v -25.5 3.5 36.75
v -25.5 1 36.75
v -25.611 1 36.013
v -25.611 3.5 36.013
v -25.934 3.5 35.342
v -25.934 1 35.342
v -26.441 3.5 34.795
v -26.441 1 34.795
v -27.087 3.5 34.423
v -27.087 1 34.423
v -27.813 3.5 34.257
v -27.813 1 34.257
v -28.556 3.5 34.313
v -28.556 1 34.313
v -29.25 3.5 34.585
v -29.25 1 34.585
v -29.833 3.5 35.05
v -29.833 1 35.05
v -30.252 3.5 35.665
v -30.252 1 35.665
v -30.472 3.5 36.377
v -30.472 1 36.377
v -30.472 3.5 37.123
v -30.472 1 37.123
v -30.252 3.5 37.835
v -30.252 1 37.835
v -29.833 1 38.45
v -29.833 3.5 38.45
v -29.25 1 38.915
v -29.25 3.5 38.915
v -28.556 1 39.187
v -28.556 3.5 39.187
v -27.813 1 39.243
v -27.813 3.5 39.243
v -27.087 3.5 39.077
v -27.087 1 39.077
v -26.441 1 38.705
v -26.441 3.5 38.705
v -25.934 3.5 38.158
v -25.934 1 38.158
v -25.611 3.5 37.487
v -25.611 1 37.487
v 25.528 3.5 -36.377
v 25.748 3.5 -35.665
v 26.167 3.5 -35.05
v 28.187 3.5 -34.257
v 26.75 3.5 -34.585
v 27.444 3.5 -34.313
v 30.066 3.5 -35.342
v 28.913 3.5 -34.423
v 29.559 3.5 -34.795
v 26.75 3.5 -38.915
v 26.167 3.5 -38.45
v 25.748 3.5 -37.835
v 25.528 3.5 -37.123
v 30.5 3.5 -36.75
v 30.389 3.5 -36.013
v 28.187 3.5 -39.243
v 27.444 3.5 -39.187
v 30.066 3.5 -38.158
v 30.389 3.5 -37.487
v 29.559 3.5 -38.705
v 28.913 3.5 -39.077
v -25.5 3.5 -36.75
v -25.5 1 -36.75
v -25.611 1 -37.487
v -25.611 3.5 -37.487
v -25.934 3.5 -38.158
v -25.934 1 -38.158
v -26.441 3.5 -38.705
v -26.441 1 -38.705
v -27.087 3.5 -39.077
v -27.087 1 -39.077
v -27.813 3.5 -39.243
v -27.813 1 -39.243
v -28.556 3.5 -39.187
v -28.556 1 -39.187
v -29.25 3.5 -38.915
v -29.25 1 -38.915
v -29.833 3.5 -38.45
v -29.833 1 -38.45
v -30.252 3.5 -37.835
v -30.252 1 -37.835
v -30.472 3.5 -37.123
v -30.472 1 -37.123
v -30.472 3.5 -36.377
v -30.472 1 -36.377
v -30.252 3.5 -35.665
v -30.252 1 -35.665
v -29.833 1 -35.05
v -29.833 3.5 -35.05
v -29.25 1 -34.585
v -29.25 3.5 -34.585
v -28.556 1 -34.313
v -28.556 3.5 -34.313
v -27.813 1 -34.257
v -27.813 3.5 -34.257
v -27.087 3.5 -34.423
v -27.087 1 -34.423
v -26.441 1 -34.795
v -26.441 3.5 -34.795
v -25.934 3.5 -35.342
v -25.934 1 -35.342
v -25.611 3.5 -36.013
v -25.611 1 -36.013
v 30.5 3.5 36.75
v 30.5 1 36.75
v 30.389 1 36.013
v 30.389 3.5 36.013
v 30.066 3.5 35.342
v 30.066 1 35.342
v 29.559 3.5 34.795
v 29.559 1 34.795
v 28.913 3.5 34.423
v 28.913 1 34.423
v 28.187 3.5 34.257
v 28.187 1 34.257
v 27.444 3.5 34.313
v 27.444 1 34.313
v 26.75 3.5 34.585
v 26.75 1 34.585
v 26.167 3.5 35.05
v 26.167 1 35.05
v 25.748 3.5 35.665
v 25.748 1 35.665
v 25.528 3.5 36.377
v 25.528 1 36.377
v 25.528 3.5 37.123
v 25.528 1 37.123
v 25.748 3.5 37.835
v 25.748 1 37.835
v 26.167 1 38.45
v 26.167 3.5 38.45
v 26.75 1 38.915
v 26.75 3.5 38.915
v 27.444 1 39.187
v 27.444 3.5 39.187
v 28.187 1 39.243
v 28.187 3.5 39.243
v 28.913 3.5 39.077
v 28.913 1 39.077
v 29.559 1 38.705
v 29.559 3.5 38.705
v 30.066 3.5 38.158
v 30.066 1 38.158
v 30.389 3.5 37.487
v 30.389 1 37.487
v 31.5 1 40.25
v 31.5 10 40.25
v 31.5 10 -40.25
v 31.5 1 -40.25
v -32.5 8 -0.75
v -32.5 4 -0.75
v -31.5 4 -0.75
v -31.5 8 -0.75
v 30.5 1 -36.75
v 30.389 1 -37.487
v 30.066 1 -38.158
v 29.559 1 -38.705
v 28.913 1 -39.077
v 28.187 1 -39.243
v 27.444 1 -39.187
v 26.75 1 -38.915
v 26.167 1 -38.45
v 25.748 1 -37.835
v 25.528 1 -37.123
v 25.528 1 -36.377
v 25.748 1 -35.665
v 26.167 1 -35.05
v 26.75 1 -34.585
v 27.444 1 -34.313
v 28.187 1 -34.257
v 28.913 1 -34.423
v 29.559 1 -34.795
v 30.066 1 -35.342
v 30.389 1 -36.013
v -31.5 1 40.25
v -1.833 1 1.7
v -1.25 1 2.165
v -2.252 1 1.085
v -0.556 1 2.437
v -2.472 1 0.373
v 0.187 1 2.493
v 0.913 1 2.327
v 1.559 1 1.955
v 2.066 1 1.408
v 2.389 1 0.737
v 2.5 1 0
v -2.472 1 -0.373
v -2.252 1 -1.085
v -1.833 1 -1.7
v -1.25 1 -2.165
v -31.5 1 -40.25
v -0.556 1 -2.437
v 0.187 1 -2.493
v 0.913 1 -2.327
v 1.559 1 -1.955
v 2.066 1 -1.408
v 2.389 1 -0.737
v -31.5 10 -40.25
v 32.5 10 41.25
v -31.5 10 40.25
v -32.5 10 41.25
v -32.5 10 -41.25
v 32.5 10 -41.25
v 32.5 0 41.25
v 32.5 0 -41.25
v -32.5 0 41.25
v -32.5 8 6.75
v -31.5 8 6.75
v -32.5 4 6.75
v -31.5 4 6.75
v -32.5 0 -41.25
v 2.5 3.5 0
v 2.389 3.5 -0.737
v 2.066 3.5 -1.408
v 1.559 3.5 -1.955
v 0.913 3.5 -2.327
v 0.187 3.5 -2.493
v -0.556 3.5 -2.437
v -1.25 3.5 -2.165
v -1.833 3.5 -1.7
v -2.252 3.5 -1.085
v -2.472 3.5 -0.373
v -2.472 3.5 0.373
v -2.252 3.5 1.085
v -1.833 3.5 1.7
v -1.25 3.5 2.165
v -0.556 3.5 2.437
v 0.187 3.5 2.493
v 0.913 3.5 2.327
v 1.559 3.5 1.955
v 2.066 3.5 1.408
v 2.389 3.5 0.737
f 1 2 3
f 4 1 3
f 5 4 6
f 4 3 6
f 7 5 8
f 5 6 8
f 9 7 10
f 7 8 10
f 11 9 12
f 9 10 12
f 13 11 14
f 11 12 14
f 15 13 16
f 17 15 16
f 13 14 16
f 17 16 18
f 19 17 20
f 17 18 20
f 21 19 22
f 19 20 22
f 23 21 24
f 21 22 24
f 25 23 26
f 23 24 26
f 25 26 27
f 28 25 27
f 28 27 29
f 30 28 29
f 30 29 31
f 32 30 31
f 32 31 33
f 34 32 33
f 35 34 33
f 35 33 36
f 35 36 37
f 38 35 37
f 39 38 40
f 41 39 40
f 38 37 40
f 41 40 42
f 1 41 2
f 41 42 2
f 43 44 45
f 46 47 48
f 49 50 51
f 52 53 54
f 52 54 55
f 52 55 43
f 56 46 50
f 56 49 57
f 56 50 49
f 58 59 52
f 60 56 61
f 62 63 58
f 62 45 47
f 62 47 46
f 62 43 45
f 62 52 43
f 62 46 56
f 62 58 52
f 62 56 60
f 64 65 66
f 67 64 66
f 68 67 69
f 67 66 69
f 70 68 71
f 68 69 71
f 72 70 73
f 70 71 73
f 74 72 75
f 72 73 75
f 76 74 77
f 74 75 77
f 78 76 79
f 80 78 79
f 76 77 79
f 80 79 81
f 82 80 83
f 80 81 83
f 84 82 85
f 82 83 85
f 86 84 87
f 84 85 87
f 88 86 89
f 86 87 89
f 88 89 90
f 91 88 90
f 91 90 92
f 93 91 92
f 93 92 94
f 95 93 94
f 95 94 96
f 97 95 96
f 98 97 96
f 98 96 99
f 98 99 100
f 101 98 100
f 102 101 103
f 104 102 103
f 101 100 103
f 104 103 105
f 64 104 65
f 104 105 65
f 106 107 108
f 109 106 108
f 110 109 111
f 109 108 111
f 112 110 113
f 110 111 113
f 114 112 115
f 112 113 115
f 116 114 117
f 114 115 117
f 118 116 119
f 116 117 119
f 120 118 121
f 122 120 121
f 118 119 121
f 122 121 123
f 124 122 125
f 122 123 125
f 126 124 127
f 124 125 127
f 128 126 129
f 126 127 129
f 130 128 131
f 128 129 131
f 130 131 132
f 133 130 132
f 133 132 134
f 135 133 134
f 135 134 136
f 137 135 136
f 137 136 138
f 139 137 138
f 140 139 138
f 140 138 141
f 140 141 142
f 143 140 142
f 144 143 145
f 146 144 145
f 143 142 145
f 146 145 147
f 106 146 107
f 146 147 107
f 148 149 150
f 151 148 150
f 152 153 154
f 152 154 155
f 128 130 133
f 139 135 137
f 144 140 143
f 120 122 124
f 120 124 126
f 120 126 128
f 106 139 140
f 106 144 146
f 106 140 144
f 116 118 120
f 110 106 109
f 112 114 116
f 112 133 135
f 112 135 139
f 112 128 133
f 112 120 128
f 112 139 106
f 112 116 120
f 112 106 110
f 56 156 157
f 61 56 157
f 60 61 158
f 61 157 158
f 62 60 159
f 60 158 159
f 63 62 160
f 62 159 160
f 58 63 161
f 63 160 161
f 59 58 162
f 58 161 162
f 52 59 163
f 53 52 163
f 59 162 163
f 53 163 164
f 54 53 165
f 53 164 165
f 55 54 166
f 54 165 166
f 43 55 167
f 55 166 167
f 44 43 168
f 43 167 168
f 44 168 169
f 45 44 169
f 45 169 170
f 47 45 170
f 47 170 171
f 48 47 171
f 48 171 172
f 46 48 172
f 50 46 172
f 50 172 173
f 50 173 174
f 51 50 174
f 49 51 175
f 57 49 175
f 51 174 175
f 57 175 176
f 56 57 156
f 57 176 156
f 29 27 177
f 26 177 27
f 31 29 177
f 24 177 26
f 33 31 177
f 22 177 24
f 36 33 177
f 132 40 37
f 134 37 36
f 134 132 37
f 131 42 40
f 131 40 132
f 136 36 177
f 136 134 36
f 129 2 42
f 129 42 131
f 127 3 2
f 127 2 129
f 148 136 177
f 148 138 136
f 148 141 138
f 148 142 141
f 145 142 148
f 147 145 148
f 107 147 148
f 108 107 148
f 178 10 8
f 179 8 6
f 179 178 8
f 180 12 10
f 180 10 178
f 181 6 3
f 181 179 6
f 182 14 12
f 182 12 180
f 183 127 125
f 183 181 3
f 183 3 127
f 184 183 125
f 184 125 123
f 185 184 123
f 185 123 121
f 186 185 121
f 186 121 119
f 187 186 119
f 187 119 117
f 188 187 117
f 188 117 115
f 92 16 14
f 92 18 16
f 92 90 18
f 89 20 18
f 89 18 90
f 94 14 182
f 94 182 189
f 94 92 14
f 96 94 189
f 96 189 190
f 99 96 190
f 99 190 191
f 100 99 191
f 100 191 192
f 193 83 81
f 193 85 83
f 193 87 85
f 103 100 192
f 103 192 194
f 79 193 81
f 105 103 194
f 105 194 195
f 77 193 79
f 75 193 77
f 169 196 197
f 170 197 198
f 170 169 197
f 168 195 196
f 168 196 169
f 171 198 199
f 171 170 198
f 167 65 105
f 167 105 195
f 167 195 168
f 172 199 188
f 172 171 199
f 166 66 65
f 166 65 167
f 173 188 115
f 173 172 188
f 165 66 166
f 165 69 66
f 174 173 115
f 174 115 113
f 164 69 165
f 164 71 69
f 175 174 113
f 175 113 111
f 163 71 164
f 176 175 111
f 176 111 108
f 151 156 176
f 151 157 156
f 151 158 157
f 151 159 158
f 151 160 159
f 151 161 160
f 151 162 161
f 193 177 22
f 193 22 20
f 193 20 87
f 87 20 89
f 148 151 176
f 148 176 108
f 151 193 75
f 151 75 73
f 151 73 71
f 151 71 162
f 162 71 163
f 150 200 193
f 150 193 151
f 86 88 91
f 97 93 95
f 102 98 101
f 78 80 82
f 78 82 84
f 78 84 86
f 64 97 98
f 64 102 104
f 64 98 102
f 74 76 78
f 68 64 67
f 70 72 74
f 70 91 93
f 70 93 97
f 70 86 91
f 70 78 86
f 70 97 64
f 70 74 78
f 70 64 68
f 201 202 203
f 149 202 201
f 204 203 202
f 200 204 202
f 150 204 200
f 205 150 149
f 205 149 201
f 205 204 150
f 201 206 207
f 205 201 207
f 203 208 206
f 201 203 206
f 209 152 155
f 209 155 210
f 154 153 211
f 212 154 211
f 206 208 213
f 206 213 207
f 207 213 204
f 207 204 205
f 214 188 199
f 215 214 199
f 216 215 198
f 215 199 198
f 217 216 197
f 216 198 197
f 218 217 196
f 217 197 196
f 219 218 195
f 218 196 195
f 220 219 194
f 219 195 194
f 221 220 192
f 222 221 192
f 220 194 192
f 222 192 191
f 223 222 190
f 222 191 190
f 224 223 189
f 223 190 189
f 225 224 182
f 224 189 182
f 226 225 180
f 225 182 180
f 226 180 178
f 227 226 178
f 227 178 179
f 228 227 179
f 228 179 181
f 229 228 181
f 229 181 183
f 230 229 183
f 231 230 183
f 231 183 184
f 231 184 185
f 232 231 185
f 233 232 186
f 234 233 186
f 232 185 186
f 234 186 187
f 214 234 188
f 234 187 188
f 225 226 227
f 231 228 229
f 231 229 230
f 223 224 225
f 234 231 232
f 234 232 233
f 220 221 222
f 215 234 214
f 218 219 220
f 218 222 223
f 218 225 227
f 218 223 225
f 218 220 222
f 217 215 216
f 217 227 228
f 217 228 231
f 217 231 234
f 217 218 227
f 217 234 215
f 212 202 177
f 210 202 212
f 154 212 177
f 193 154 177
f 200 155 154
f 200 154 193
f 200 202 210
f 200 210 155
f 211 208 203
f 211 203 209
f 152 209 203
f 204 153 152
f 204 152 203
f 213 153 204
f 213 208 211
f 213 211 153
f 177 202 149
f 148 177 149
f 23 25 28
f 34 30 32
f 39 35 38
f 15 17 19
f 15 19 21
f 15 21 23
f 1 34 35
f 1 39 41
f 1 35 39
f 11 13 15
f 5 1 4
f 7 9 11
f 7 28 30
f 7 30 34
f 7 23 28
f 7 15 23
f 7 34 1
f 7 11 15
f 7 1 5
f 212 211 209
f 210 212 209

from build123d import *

# Parameters (mm, degrees)
SKETCH1_W           = 65
SKETCH1_H           = 82.5
BOSS_EXTRUDE1_DEPTH = 10
SKETCH2_W           = 63
SKETCH2_H           = 80.5
CUT_EXTRUDE1_DEPTH  = 9
SKETCH4_R           = 2.5
BOSS_EXTRUDE2_DEPTH = 2.5
SKETCH5_W           = 7.5
SKETCH5_H           = 4
CUT_EXTRUDE2_DEPTH  = 1


with BuildPart() as part:
    # Sketch1 → Boss-Extrude1 (new body)
    with BuildSketch(Plane(origin=(0, 0, 0), x_dir=(1, 0, 0), z_dir=(0, 1, 0))):
        Rectangle(SKETCH1_W, SKETCH1_H)
    extrude(amount=BOSS_EXTRUDE1_DEPTH)

    # Sketch2 → Cut-Extrude1 (cut)
    with BuildSketch(Plane(origin=(0, 10, 0), x_dir=(1, 0, 0), z_dir=(0, 1, 0))):
        Rectangle(SKETCH2_W, SKETCH2_H)
    extrude(amount=-CUT_EXTRUDE1_DEPTH, mode=Mode.SUBTRACT)

    # Sketch4 → Boss-Extrude2 (add)
    with BuildSketch(Plane(origin=(0, 1, 0), x_dir=(1, 0, 0), z_dir=(0, 1, 0))):
        with Locations((-28, 36.75)):
            Circle(SKETCH4_R)
        with Locations((28, 36.75)):
            Circle(SKETCH4_R)
        with Locations((-28, -36.75)):
            Circle(SKETCH4_R)
        with Locations((28, -36.75)):
            Circle(SKETCH4_R)
        Circle(SKETCH4_R)
    extrude(amount=BOSS_EXTRUDE2_DEPTH)

    # Sketch5 → Cut-Extrude2 (cut)
    with BuildSketch(Plane.ZY.offset(32.5)):
        with Locations((3, 6)):
            Rectangle(SKETCH5_W, SKETCH5_H)
    extrude(amount=-CUT_EXTRUDE2_DEPTH, mode=Mode.SUBTRACT)


solid = part.part
